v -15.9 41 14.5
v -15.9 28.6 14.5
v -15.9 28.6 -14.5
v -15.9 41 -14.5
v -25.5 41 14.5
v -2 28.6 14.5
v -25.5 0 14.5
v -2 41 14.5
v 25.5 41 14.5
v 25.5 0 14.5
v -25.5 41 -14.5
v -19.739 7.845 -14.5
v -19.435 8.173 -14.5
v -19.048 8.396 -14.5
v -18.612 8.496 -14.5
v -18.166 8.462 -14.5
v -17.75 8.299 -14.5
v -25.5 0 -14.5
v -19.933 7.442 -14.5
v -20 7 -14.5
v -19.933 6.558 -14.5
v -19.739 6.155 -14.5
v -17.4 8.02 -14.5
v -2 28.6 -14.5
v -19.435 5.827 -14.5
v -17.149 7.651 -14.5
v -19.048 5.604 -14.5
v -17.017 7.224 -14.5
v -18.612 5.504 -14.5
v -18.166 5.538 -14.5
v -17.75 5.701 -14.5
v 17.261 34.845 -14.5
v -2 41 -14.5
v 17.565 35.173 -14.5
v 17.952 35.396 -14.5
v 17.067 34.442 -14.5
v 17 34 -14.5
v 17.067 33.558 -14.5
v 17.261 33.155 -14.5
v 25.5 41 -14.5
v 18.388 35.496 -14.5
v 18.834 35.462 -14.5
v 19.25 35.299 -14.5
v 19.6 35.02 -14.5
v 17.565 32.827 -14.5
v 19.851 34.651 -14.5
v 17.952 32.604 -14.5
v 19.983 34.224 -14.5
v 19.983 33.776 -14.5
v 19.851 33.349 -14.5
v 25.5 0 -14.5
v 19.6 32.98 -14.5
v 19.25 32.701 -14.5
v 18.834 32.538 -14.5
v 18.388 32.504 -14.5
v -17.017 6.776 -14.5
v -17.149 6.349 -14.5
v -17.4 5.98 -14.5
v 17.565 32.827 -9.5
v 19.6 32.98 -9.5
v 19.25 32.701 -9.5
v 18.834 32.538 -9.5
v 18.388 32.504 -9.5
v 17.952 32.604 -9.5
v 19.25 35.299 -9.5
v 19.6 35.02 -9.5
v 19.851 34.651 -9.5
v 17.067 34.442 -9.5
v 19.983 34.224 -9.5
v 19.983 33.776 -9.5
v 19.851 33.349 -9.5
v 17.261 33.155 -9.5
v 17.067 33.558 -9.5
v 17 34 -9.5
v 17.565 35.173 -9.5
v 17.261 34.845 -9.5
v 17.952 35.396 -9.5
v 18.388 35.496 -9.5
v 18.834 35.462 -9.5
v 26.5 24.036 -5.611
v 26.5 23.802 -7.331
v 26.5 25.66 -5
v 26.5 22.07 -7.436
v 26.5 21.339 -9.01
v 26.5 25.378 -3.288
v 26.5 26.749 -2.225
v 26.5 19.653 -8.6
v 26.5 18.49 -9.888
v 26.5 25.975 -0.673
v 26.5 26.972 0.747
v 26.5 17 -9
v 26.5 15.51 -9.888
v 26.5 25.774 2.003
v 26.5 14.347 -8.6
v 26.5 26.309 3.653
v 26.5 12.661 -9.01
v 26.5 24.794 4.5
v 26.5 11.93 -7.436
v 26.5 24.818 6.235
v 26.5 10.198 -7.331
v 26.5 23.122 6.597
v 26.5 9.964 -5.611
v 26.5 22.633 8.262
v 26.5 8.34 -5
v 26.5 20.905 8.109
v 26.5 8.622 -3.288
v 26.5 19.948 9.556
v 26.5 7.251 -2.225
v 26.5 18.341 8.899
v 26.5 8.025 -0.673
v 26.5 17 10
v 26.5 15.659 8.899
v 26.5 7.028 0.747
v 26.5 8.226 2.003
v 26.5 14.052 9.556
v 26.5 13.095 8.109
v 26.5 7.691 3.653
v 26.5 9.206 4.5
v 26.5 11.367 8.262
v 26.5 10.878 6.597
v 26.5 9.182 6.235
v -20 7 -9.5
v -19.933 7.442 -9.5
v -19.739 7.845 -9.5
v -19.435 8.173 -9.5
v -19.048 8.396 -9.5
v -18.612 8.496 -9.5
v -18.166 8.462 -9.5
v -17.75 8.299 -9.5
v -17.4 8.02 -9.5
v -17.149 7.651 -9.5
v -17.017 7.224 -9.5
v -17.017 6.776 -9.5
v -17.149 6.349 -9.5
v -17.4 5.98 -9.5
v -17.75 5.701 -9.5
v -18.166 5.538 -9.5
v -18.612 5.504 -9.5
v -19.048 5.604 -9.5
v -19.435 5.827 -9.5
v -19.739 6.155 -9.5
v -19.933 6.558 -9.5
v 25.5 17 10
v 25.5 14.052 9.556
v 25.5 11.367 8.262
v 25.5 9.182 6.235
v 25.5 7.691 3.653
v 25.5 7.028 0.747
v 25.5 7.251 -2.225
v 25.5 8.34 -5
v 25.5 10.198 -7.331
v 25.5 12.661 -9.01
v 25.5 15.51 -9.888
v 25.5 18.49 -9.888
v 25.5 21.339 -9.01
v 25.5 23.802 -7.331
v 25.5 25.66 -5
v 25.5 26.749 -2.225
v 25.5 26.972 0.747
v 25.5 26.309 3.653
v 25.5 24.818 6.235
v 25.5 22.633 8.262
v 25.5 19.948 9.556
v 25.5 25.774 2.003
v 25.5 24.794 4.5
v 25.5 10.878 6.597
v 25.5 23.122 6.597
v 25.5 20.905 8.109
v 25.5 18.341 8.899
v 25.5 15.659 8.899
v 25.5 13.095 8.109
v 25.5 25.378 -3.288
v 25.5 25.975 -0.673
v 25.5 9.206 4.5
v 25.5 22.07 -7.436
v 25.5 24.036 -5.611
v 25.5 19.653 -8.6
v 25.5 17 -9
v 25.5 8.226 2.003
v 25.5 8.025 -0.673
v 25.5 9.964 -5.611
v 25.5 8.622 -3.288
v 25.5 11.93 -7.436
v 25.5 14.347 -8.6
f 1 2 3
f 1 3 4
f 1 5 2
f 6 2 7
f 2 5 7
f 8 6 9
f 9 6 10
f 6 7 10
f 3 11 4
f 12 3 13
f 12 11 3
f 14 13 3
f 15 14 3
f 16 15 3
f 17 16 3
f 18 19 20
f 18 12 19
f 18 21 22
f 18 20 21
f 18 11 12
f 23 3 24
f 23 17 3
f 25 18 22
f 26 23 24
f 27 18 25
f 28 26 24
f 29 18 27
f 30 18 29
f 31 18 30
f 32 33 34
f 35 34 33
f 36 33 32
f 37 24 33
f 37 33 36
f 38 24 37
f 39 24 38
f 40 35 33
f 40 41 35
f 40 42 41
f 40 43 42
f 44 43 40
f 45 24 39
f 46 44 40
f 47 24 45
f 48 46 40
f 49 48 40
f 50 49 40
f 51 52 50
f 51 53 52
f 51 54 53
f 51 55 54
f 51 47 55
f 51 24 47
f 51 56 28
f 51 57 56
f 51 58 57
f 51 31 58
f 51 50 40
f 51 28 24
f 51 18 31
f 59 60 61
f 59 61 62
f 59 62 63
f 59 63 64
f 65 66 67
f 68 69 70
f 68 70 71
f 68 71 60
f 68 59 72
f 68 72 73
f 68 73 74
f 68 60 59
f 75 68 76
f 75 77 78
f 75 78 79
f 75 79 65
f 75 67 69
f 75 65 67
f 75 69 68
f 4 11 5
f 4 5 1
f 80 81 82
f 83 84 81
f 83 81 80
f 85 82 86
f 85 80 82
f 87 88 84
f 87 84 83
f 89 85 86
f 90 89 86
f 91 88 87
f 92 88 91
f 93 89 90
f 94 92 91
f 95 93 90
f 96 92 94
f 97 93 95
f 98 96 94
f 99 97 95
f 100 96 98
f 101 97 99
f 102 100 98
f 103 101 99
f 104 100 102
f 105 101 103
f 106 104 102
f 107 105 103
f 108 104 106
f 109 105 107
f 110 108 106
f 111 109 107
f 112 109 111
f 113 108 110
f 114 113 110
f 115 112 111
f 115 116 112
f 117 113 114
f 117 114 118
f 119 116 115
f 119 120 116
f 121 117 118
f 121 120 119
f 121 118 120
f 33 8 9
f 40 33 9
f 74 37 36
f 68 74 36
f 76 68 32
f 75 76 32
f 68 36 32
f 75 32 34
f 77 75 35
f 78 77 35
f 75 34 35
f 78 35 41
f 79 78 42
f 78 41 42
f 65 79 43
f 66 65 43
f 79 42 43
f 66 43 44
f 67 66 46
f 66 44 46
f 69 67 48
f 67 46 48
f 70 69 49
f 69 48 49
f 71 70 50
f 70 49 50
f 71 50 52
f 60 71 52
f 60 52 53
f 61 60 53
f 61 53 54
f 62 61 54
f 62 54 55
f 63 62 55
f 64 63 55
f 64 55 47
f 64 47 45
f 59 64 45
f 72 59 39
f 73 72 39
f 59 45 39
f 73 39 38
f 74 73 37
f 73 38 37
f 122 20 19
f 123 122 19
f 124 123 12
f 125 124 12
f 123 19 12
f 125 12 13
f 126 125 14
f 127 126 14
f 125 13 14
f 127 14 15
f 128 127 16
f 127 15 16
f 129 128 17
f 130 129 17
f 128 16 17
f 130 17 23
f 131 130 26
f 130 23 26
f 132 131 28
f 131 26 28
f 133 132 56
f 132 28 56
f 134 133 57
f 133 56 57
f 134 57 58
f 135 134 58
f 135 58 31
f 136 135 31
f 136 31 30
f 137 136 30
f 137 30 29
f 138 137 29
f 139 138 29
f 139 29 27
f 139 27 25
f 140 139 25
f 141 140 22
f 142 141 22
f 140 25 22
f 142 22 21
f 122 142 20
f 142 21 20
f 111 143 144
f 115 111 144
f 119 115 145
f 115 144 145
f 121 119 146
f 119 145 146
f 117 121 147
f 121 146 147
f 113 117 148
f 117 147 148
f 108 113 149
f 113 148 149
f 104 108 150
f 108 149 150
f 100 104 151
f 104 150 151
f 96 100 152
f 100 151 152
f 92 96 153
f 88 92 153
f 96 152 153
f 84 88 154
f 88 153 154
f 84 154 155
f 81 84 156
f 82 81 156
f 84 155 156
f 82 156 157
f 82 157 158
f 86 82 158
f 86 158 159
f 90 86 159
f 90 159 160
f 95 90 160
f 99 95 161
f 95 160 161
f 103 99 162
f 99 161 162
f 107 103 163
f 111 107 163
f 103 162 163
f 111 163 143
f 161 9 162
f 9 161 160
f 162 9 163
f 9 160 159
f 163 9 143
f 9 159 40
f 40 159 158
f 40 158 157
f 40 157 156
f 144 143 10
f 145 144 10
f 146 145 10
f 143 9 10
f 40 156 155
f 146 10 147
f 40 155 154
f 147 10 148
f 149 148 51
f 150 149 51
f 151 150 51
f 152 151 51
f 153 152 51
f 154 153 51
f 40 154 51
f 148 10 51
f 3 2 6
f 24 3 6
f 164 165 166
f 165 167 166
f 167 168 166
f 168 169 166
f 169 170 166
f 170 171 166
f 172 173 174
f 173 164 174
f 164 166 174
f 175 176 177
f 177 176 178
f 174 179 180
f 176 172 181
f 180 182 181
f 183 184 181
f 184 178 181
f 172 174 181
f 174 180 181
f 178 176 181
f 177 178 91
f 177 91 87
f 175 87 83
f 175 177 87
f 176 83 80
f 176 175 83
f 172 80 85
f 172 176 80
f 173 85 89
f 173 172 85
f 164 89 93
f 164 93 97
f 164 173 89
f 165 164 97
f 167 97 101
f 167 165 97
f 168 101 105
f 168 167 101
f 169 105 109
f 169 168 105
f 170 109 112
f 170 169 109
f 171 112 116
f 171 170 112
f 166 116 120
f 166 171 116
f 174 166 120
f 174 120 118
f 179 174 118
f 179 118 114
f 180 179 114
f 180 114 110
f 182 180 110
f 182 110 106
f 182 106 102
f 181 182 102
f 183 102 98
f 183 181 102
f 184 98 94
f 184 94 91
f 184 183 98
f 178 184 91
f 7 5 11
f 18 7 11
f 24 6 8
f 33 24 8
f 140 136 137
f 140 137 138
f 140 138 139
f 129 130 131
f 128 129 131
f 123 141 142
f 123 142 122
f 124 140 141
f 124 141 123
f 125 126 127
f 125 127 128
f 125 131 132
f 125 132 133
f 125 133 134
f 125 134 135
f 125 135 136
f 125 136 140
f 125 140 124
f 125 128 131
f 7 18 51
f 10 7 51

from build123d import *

# Parameters (mm, degrees)
SKETCH1_W           = 51
SKETCH1_H           = 29
BOSS_EXTRUDE1_DEPTH = 41
SKETCH2_R           = 10
SKETCH2_R_2         = 9
BOSS_EXTRUDE2_DEPTH = 1
SKETCH3_W           = 13.9
SKETCH3_H           = 12.4
CUT_EXTRUDE1_DEPTH  = 57.782479692
SKETCH4_R           = 1.5
CUT_EXTRUDE2_DEPTH  = 5


with BuildPart() as part:
    # Sketch1 → Boss-Extrude1 (new body)
    with BuildSketch(Plane(origin=(0, 0, 0), x_dir=(1, 0, 0), z_dir=(0, 1, 0))):
        Rectangle(SKETCH1_W, SKETCH1_H)
    extrude(amount=BOSS_EXTRUDE1_DEPTH)

    # Sketch2 → Boss-Extrude2 (add)
    with BuildSketch(Plane(origin=(25.5, 0, 0), x_dir=(0, 0, -1), z_dir=(1, 0, 0))):
        with Locations(Location((0, 17, 0), (0, 0, 180))):
            Circle(SKETCH2_R)
        with Locations((0, 17)):
            Circle(SKETCH2_R_2, mode=Mode.SUBTRACT)
    extrude(amount=BOSS_EXTRUDE2_DEPTH)

    # Sketch3 → Cut-Extrude1 (cut, through all)
    with BuildSketch(Plane.XY.offset(14.5)):
        with Locations((-8.95, 34.8)):
            Rectangle(SKETCH3_W, SKETCH3_H)
    extrude(amount=-CUT_EXTRUDE1_DEPTH, mode=Mode.SUBTRACT)

    # Sketch4 → Cut-Extrude2 (cut)
    with BuildSketch(Plane(origin=(0, 0, -14.5), x_dir=(-1, 0, 0), z_dir=(0, 0, -1))):
        with Locations((-18.5, 34)):
            Circle(SKETCH4_R)
        with Locations((18.5, 7)):
            Circle(SKETCH4_R)
    extrude(amount=-CUT_EXTRUDE2_DEPTH, mode=Mode.SUBTRACT)


solid = part.part
